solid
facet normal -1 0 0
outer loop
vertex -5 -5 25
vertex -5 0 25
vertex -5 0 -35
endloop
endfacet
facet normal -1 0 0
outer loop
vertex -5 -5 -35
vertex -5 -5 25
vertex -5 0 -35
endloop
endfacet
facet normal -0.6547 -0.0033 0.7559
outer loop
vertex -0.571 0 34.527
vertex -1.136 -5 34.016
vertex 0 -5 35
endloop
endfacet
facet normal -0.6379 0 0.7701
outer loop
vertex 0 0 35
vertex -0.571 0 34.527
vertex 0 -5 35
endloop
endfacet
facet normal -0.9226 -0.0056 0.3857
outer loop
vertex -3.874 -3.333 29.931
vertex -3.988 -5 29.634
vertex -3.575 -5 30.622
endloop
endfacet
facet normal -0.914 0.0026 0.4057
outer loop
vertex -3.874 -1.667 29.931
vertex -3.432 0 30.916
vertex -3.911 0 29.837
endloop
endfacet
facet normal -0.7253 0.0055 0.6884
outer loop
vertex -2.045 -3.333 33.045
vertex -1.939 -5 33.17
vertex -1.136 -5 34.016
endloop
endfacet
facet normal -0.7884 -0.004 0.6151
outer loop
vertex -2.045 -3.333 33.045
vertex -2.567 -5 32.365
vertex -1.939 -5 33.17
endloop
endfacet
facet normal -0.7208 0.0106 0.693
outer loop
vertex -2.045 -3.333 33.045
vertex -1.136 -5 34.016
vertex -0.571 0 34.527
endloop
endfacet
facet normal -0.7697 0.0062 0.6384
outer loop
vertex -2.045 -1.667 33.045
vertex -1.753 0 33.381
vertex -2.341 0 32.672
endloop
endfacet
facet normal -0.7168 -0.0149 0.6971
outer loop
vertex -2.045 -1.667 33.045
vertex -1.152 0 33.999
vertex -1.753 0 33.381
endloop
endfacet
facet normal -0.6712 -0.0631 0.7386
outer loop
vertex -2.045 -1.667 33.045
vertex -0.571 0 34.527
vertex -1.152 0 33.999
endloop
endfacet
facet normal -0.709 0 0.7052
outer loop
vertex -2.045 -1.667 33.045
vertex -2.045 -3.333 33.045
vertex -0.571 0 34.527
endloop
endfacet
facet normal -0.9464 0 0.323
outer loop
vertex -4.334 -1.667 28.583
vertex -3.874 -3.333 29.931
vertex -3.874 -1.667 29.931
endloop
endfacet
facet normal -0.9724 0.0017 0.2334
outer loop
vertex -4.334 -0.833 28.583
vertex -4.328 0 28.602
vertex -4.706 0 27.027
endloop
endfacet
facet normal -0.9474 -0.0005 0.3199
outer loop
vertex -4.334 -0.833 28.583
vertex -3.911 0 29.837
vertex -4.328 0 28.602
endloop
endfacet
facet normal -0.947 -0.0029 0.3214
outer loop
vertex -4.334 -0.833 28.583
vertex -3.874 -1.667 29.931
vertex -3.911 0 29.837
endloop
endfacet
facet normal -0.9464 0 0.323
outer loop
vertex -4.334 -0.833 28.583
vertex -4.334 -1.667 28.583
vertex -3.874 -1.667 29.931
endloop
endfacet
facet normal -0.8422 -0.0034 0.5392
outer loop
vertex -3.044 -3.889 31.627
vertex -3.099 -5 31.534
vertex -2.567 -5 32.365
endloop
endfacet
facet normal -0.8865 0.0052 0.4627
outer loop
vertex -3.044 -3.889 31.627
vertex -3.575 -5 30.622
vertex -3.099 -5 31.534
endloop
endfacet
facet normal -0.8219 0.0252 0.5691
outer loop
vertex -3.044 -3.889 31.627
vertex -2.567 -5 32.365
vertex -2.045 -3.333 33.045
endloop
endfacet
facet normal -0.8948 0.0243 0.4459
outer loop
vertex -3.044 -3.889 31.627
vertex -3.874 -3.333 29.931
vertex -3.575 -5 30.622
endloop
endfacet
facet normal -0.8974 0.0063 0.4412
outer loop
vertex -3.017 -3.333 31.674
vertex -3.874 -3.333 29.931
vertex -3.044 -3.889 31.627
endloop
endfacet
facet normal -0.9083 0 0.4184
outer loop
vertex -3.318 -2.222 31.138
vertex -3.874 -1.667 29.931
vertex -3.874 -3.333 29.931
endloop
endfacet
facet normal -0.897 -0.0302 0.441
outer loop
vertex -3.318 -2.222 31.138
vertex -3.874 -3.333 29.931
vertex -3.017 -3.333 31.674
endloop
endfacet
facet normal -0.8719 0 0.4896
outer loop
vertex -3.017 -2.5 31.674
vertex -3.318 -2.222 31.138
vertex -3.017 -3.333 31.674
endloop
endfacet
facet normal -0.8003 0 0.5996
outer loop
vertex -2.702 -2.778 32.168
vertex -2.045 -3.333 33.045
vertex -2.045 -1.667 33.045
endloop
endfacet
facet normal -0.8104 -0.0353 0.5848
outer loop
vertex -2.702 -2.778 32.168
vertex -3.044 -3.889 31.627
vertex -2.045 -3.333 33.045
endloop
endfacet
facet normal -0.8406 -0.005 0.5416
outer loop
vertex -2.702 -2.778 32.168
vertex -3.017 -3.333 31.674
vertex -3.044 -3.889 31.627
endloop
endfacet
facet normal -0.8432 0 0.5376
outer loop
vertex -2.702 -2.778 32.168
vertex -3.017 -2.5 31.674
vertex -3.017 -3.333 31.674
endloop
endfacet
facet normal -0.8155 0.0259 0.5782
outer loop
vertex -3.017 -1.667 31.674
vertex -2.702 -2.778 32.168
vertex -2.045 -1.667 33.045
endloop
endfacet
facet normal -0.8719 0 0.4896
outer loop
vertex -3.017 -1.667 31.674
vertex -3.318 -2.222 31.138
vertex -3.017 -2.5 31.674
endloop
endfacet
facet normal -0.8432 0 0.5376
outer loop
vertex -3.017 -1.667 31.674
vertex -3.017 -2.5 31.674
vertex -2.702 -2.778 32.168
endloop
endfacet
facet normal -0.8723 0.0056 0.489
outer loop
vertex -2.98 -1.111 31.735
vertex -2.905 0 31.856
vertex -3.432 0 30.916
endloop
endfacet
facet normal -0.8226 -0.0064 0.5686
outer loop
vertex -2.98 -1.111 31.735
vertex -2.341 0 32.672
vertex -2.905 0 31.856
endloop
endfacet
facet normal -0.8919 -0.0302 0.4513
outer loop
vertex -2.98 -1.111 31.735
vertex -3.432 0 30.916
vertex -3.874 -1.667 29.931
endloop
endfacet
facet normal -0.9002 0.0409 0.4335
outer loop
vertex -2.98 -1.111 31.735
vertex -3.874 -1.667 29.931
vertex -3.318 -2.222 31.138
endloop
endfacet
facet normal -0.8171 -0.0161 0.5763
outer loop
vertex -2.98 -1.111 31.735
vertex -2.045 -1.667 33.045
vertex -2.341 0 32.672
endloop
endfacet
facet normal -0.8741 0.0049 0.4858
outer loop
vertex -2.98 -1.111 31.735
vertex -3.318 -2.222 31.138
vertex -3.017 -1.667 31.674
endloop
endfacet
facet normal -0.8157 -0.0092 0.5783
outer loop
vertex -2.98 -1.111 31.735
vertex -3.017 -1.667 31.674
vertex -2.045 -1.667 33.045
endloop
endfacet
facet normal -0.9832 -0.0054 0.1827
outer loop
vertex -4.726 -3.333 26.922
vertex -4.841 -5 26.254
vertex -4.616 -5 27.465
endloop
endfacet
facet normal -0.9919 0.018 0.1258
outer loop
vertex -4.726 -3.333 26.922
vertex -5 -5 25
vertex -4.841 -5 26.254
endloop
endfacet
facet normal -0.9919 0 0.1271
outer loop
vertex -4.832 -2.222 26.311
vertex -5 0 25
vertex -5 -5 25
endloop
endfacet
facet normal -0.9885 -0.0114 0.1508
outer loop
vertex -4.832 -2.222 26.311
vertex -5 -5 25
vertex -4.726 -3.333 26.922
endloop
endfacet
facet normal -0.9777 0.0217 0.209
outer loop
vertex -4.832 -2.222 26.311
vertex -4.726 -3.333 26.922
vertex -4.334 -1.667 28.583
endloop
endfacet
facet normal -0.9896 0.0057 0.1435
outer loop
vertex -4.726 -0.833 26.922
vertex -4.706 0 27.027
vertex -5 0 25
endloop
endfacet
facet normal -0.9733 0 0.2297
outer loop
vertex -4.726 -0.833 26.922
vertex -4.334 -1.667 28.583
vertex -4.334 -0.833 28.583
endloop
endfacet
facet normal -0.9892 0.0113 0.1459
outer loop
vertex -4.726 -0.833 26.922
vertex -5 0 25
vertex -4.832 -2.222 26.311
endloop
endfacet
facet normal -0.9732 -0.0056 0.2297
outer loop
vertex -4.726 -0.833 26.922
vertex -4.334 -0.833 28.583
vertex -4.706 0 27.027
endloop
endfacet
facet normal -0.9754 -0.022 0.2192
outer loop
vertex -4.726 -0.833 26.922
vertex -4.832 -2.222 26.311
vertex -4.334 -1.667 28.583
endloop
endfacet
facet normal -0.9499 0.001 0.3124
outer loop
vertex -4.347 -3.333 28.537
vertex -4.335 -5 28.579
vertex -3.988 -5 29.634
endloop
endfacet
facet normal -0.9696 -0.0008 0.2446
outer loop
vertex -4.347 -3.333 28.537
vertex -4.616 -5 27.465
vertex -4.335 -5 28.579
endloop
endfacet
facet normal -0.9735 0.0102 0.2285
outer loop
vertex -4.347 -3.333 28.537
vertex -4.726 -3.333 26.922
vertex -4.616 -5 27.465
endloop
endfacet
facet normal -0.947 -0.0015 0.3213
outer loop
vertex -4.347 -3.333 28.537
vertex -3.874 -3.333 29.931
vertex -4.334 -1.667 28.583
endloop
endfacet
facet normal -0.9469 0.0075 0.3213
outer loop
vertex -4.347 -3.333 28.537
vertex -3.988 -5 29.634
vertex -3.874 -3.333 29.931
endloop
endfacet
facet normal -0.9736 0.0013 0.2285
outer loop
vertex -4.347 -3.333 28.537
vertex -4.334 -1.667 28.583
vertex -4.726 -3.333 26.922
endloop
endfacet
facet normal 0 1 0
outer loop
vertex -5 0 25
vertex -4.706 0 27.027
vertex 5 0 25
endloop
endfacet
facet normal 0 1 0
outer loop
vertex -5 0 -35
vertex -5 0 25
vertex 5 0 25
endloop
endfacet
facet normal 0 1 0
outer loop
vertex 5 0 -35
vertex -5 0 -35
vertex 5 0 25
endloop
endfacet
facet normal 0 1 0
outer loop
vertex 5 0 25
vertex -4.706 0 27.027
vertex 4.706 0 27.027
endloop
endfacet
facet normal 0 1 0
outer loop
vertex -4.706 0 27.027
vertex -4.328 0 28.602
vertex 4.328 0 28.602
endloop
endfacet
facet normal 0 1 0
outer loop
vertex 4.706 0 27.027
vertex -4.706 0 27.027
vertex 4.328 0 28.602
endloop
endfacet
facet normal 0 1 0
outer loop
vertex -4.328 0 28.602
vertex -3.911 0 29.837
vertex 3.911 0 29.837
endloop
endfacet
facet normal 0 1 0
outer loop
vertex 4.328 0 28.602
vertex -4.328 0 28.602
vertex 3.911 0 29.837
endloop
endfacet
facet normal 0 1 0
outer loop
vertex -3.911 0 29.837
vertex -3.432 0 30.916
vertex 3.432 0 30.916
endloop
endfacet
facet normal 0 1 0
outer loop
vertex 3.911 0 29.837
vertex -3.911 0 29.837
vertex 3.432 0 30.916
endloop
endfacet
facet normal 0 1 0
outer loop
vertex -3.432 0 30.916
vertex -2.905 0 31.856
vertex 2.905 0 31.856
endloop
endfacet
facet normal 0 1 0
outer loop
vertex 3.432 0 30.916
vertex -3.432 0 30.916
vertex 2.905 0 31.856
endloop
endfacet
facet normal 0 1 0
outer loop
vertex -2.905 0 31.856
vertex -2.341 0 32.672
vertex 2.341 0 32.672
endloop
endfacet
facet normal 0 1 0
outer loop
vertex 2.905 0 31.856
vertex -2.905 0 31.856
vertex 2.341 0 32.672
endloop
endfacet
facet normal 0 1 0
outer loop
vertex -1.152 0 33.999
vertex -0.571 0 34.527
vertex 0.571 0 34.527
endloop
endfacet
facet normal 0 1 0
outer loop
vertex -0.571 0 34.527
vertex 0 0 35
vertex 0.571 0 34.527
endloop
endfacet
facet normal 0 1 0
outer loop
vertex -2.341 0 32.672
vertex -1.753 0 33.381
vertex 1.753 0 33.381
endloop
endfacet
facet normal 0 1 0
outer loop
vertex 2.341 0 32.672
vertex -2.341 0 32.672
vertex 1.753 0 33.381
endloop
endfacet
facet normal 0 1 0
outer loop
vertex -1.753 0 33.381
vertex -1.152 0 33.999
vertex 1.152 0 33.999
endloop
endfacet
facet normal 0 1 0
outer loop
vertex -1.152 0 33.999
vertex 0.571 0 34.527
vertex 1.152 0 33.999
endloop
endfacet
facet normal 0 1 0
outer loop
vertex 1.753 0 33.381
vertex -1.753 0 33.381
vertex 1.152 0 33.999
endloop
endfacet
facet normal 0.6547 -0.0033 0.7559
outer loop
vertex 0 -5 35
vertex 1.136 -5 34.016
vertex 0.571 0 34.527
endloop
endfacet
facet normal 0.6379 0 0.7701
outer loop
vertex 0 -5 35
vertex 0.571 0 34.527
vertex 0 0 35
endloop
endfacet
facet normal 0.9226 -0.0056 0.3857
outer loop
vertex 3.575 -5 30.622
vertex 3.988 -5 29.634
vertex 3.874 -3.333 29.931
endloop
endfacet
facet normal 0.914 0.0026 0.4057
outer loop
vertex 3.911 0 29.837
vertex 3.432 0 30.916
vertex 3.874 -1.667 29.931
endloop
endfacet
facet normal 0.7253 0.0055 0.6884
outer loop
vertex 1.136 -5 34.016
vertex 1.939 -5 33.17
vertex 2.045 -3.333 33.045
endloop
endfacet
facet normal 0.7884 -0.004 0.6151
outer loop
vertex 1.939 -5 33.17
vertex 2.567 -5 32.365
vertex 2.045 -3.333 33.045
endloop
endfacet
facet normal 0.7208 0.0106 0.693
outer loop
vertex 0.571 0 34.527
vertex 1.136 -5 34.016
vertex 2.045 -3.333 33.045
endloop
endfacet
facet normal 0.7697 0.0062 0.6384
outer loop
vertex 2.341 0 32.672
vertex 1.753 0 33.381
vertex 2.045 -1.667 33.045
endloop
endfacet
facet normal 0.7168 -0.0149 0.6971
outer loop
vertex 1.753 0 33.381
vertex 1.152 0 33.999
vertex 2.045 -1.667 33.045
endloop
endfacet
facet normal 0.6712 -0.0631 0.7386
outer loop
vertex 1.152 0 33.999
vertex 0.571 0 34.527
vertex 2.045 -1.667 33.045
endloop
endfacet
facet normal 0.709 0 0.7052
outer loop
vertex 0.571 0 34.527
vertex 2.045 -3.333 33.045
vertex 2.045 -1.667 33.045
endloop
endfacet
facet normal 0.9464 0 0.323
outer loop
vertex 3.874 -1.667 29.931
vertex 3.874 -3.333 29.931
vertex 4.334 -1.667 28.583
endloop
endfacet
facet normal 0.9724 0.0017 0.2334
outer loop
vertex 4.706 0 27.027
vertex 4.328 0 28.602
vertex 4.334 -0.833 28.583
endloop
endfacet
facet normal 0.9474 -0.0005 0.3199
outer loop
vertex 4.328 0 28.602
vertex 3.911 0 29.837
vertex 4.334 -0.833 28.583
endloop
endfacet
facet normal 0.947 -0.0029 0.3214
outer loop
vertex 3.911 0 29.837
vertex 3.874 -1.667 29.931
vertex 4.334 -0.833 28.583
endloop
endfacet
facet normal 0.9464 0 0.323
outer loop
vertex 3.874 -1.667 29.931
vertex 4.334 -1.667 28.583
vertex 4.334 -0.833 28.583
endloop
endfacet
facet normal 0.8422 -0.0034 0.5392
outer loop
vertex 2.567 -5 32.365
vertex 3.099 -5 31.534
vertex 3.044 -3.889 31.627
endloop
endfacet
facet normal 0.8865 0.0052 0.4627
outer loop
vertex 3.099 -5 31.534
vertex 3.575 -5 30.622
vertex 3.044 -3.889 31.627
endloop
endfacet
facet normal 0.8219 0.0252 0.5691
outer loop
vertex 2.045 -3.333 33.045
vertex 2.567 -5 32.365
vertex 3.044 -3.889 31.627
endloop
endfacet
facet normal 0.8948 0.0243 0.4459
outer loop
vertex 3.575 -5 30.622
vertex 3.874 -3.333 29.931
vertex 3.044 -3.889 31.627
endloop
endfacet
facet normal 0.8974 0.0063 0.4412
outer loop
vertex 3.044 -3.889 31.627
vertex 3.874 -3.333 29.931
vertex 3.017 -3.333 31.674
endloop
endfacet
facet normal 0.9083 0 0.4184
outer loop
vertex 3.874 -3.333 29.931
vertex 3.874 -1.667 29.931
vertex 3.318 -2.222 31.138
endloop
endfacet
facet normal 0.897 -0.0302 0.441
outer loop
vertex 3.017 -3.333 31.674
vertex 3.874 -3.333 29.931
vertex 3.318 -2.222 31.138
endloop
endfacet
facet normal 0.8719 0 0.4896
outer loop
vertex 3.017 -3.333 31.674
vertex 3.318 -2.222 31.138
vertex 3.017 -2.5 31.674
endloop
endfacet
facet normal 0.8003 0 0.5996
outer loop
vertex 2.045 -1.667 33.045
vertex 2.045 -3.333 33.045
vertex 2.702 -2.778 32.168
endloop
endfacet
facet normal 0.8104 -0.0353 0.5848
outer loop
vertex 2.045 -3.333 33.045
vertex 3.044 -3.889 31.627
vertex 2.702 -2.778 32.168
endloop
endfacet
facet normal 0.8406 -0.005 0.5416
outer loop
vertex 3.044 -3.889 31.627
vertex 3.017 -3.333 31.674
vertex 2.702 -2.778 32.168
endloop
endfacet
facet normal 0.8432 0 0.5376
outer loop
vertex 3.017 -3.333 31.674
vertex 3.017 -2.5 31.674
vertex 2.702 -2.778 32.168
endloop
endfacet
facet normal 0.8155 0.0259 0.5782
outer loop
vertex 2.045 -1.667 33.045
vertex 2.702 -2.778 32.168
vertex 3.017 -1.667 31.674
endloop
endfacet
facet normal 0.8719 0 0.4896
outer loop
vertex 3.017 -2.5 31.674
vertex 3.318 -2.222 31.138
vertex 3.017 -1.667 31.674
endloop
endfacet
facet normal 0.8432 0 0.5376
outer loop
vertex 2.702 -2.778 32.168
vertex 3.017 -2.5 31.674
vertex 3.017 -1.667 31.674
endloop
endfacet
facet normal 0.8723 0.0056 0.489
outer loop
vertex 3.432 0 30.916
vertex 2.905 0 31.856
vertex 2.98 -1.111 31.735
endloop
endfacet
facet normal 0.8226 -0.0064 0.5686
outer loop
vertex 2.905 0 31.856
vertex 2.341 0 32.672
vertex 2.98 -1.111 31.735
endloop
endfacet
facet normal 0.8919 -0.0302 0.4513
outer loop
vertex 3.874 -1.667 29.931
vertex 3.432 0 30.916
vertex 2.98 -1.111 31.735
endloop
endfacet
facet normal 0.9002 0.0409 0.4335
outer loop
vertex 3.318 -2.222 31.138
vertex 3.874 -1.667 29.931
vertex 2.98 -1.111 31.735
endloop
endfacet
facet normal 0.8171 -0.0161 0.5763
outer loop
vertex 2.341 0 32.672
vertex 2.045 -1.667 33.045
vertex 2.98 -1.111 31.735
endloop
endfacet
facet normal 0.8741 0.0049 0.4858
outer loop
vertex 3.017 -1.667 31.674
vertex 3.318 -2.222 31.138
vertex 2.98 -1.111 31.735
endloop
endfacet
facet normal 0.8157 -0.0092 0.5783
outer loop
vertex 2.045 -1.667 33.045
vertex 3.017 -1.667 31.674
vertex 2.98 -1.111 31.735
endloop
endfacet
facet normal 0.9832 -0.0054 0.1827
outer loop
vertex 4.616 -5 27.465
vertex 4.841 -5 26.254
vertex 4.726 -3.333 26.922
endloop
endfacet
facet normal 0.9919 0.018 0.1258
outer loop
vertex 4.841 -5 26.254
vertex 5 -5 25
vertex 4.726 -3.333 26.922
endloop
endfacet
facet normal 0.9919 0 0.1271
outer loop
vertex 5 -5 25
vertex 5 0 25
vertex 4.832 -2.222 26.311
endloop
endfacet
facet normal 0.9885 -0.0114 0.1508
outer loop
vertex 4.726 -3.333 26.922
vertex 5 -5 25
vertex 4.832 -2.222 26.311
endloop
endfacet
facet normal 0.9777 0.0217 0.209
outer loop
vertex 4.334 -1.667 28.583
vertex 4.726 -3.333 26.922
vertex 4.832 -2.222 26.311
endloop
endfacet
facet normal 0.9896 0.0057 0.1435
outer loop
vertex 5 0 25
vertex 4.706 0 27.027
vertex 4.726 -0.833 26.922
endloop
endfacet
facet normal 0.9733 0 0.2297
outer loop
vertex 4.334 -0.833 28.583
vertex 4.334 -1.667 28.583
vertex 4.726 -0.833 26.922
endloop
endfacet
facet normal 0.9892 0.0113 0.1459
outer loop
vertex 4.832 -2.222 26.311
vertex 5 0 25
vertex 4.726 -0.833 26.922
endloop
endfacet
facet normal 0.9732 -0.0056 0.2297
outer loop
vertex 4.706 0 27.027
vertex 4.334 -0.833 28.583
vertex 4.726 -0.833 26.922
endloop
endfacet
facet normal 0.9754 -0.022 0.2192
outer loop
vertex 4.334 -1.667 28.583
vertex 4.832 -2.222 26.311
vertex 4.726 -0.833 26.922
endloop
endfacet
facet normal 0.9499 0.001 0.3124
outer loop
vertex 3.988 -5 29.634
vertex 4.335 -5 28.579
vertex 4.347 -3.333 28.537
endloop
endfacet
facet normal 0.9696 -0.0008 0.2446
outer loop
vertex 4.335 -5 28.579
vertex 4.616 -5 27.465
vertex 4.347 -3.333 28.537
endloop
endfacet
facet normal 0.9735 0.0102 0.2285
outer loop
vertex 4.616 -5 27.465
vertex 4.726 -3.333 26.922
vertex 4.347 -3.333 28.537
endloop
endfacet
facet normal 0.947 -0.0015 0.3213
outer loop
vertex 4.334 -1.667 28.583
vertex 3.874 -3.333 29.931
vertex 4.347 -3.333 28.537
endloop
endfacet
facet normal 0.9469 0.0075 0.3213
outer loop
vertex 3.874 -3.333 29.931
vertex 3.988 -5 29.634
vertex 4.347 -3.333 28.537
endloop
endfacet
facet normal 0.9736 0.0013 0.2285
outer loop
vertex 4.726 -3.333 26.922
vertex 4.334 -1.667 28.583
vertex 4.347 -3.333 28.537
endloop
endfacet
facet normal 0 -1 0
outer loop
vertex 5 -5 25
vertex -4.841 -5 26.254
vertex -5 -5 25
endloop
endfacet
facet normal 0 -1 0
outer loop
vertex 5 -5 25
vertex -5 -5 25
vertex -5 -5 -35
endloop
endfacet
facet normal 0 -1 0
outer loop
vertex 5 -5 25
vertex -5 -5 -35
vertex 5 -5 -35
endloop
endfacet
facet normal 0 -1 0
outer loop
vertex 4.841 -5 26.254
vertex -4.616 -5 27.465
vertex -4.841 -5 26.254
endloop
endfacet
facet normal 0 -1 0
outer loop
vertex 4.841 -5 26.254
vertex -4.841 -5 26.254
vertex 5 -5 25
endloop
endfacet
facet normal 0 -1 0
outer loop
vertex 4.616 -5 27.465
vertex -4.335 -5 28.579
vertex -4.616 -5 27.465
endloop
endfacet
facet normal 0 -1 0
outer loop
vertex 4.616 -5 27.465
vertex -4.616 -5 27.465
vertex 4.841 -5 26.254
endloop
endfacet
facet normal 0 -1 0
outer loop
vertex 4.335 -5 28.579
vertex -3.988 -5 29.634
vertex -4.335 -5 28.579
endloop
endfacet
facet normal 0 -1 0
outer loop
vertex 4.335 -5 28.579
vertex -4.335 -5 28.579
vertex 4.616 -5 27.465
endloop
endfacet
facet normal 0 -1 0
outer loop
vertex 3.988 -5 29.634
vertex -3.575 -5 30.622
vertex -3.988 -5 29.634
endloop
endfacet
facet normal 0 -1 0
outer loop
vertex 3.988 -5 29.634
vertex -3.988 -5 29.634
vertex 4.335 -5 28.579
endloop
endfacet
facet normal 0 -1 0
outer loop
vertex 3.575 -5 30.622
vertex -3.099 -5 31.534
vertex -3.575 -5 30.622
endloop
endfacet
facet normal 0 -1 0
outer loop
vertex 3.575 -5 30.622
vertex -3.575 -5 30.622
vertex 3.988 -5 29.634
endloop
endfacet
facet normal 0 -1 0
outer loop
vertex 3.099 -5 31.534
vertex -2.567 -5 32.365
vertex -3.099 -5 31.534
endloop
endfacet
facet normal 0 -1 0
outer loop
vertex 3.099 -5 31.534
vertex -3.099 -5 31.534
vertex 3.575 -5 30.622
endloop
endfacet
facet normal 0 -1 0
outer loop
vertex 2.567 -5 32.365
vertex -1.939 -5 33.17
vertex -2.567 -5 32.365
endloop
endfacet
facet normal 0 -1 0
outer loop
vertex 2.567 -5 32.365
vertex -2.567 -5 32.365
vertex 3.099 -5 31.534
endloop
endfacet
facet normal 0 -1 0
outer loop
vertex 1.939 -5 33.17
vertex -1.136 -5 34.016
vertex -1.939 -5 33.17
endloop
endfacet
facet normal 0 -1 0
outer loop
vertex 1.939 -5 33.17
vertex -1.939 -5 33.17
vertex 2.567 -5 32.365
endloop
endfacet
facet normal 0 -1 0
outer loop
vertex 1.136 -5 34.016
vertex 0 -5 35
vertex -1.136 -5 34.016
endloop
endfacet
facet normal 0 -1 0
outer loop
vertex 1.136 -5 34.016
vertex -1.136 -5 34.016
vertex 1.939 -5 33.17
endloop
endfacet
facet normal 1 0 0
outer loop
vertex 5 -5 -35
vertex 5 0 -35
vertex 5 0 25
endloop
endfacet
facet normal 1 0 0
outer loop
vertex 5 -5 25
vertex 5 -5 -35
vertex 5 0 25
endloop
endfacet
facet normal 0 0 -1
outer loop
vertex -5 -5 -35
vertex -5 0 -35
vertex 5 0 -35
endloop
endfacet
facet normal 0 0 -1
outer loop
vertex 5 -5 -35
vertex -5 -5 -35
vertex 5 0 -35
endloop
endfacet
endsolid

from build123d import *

# Parameters (mm, degrees)
F1_DEPTH      = 5
F2_DEPTH      = 25
F2_DEPTH_BACK = 74
F3_DEPTH      = 74
F3_DEPTH_BACK = 5.0010001


# Not quite as in the source:
# - an extrude ends at something that could not be found from the text; its depth is read off the source's solid


with BuildPart() as f1:
    # F0 (on Front) → F1 (new body)
    with BuildSketch(Plane.XZ):
        with BuildLine():
            add(Edge.make_bspline(
                [(5, 25), (4.3878769502, 31.0586858541), (1.9895534497, 33.4048718214), (0, 35)],
                knots=[0, 0, 0, 0, 11.1803398875, 11.1803398875, 11.1803398875, 11.1803398875], degree=3))
            add(Edge.make_bspline(
                [(-5, 25), (-4.3878769502, 31.0586858541), (-1.9895534497, 33.4048718214), (0, 35)],
                knots=[0, 0, 0, 0, 11.1803398875, 11.1803398875, 11.1803398875, 11.1803398875], degree=3))
            Line((-5, 25), (-5, -35))
            Line((-5, -35), (5, -35))
            Line((5, -35), (5, 25))
        make_face()
        with BuildLine():
            Line((5, 25), (5, 35))
            Line((5, 35), (0, 35))
            add(Edge.make_bspline(
                [(5, 25), (4.3878769502, 31.0586858541), (1.9895534497, 33.4048718214), (0, 35)],
                knots=[0, 0, 0, 0, 11.1803398875, 11.1803398875, 11.1803398875, 11.1803398875], degree=3))
        make_face()
        with BuildLine():
            add(Edge.make_bspline(
                [(-5, 25), (-4.3878769502, 31.0586858541), (-1.9895534497, 33.4048718214), (0, 35)],
                knots=[0, 0, 0, 0, 11.1803398875, 11.1803398875, 11.1803398875, 11.1803398875], degree=3))
            Line((0, 35), (-5, 35))
            Line((-5, 35), (-5, 25))
        make_face()
    extrude(amount=F1_DEPTH)

    # F0 (on Front) → F2 (cut, two sides)
    with BuildSketch(Plane.XZ) as f2_sk:
        with BuildLine():
            add(Edge.make_bspline(
                [(-5, 25), (-4.3878769502, 31.0586858541), (-1.9895534497, 33.4048718214), (0, 35)],
                knots=[0, 0, 0, 0, 11.1803398875, 11.1803398875, 11.1803398875, 11.1803398875], degree=3))
            Line((0, 35), (-5, 35))
            Line((-5, 35), (-5, 25))
        make_face()
    extrude(amount=F2_DEPTH, mode=Mode.SUBTRACT)
    extrude(f2_sk.sketch, amount=-F2_DEPTH_BACK, mode=Mode.SUBTRACT)

    # F0 (on Front) → F3 (cut, two sides)
    with BuildSketch(Plane.XZ) as f3_sk:
        with BuildLine():
            Line((5, 25), (5, 35))
            Line((5, 35), (0, 35))
            add(Edge.make_bspline(
                [(5, 25), (4.3878769502, 31.0586858541), (1.9895534497, 33.4048718214), (0, 35)],
                knots=[0, 0, 0, 0, 11.1803398875, 11.1803398875, 11.1803398875, 11.1803398875], degree=3))
        make_face()
    extrude(amount=-F3_DEPTH, mode=Mode.SUBTRACT)
    extrude(f3_sk.sketch, amount=F3_DEPTH_BACK, mode=Mode.SUBTRACT)


solid = f1.part
